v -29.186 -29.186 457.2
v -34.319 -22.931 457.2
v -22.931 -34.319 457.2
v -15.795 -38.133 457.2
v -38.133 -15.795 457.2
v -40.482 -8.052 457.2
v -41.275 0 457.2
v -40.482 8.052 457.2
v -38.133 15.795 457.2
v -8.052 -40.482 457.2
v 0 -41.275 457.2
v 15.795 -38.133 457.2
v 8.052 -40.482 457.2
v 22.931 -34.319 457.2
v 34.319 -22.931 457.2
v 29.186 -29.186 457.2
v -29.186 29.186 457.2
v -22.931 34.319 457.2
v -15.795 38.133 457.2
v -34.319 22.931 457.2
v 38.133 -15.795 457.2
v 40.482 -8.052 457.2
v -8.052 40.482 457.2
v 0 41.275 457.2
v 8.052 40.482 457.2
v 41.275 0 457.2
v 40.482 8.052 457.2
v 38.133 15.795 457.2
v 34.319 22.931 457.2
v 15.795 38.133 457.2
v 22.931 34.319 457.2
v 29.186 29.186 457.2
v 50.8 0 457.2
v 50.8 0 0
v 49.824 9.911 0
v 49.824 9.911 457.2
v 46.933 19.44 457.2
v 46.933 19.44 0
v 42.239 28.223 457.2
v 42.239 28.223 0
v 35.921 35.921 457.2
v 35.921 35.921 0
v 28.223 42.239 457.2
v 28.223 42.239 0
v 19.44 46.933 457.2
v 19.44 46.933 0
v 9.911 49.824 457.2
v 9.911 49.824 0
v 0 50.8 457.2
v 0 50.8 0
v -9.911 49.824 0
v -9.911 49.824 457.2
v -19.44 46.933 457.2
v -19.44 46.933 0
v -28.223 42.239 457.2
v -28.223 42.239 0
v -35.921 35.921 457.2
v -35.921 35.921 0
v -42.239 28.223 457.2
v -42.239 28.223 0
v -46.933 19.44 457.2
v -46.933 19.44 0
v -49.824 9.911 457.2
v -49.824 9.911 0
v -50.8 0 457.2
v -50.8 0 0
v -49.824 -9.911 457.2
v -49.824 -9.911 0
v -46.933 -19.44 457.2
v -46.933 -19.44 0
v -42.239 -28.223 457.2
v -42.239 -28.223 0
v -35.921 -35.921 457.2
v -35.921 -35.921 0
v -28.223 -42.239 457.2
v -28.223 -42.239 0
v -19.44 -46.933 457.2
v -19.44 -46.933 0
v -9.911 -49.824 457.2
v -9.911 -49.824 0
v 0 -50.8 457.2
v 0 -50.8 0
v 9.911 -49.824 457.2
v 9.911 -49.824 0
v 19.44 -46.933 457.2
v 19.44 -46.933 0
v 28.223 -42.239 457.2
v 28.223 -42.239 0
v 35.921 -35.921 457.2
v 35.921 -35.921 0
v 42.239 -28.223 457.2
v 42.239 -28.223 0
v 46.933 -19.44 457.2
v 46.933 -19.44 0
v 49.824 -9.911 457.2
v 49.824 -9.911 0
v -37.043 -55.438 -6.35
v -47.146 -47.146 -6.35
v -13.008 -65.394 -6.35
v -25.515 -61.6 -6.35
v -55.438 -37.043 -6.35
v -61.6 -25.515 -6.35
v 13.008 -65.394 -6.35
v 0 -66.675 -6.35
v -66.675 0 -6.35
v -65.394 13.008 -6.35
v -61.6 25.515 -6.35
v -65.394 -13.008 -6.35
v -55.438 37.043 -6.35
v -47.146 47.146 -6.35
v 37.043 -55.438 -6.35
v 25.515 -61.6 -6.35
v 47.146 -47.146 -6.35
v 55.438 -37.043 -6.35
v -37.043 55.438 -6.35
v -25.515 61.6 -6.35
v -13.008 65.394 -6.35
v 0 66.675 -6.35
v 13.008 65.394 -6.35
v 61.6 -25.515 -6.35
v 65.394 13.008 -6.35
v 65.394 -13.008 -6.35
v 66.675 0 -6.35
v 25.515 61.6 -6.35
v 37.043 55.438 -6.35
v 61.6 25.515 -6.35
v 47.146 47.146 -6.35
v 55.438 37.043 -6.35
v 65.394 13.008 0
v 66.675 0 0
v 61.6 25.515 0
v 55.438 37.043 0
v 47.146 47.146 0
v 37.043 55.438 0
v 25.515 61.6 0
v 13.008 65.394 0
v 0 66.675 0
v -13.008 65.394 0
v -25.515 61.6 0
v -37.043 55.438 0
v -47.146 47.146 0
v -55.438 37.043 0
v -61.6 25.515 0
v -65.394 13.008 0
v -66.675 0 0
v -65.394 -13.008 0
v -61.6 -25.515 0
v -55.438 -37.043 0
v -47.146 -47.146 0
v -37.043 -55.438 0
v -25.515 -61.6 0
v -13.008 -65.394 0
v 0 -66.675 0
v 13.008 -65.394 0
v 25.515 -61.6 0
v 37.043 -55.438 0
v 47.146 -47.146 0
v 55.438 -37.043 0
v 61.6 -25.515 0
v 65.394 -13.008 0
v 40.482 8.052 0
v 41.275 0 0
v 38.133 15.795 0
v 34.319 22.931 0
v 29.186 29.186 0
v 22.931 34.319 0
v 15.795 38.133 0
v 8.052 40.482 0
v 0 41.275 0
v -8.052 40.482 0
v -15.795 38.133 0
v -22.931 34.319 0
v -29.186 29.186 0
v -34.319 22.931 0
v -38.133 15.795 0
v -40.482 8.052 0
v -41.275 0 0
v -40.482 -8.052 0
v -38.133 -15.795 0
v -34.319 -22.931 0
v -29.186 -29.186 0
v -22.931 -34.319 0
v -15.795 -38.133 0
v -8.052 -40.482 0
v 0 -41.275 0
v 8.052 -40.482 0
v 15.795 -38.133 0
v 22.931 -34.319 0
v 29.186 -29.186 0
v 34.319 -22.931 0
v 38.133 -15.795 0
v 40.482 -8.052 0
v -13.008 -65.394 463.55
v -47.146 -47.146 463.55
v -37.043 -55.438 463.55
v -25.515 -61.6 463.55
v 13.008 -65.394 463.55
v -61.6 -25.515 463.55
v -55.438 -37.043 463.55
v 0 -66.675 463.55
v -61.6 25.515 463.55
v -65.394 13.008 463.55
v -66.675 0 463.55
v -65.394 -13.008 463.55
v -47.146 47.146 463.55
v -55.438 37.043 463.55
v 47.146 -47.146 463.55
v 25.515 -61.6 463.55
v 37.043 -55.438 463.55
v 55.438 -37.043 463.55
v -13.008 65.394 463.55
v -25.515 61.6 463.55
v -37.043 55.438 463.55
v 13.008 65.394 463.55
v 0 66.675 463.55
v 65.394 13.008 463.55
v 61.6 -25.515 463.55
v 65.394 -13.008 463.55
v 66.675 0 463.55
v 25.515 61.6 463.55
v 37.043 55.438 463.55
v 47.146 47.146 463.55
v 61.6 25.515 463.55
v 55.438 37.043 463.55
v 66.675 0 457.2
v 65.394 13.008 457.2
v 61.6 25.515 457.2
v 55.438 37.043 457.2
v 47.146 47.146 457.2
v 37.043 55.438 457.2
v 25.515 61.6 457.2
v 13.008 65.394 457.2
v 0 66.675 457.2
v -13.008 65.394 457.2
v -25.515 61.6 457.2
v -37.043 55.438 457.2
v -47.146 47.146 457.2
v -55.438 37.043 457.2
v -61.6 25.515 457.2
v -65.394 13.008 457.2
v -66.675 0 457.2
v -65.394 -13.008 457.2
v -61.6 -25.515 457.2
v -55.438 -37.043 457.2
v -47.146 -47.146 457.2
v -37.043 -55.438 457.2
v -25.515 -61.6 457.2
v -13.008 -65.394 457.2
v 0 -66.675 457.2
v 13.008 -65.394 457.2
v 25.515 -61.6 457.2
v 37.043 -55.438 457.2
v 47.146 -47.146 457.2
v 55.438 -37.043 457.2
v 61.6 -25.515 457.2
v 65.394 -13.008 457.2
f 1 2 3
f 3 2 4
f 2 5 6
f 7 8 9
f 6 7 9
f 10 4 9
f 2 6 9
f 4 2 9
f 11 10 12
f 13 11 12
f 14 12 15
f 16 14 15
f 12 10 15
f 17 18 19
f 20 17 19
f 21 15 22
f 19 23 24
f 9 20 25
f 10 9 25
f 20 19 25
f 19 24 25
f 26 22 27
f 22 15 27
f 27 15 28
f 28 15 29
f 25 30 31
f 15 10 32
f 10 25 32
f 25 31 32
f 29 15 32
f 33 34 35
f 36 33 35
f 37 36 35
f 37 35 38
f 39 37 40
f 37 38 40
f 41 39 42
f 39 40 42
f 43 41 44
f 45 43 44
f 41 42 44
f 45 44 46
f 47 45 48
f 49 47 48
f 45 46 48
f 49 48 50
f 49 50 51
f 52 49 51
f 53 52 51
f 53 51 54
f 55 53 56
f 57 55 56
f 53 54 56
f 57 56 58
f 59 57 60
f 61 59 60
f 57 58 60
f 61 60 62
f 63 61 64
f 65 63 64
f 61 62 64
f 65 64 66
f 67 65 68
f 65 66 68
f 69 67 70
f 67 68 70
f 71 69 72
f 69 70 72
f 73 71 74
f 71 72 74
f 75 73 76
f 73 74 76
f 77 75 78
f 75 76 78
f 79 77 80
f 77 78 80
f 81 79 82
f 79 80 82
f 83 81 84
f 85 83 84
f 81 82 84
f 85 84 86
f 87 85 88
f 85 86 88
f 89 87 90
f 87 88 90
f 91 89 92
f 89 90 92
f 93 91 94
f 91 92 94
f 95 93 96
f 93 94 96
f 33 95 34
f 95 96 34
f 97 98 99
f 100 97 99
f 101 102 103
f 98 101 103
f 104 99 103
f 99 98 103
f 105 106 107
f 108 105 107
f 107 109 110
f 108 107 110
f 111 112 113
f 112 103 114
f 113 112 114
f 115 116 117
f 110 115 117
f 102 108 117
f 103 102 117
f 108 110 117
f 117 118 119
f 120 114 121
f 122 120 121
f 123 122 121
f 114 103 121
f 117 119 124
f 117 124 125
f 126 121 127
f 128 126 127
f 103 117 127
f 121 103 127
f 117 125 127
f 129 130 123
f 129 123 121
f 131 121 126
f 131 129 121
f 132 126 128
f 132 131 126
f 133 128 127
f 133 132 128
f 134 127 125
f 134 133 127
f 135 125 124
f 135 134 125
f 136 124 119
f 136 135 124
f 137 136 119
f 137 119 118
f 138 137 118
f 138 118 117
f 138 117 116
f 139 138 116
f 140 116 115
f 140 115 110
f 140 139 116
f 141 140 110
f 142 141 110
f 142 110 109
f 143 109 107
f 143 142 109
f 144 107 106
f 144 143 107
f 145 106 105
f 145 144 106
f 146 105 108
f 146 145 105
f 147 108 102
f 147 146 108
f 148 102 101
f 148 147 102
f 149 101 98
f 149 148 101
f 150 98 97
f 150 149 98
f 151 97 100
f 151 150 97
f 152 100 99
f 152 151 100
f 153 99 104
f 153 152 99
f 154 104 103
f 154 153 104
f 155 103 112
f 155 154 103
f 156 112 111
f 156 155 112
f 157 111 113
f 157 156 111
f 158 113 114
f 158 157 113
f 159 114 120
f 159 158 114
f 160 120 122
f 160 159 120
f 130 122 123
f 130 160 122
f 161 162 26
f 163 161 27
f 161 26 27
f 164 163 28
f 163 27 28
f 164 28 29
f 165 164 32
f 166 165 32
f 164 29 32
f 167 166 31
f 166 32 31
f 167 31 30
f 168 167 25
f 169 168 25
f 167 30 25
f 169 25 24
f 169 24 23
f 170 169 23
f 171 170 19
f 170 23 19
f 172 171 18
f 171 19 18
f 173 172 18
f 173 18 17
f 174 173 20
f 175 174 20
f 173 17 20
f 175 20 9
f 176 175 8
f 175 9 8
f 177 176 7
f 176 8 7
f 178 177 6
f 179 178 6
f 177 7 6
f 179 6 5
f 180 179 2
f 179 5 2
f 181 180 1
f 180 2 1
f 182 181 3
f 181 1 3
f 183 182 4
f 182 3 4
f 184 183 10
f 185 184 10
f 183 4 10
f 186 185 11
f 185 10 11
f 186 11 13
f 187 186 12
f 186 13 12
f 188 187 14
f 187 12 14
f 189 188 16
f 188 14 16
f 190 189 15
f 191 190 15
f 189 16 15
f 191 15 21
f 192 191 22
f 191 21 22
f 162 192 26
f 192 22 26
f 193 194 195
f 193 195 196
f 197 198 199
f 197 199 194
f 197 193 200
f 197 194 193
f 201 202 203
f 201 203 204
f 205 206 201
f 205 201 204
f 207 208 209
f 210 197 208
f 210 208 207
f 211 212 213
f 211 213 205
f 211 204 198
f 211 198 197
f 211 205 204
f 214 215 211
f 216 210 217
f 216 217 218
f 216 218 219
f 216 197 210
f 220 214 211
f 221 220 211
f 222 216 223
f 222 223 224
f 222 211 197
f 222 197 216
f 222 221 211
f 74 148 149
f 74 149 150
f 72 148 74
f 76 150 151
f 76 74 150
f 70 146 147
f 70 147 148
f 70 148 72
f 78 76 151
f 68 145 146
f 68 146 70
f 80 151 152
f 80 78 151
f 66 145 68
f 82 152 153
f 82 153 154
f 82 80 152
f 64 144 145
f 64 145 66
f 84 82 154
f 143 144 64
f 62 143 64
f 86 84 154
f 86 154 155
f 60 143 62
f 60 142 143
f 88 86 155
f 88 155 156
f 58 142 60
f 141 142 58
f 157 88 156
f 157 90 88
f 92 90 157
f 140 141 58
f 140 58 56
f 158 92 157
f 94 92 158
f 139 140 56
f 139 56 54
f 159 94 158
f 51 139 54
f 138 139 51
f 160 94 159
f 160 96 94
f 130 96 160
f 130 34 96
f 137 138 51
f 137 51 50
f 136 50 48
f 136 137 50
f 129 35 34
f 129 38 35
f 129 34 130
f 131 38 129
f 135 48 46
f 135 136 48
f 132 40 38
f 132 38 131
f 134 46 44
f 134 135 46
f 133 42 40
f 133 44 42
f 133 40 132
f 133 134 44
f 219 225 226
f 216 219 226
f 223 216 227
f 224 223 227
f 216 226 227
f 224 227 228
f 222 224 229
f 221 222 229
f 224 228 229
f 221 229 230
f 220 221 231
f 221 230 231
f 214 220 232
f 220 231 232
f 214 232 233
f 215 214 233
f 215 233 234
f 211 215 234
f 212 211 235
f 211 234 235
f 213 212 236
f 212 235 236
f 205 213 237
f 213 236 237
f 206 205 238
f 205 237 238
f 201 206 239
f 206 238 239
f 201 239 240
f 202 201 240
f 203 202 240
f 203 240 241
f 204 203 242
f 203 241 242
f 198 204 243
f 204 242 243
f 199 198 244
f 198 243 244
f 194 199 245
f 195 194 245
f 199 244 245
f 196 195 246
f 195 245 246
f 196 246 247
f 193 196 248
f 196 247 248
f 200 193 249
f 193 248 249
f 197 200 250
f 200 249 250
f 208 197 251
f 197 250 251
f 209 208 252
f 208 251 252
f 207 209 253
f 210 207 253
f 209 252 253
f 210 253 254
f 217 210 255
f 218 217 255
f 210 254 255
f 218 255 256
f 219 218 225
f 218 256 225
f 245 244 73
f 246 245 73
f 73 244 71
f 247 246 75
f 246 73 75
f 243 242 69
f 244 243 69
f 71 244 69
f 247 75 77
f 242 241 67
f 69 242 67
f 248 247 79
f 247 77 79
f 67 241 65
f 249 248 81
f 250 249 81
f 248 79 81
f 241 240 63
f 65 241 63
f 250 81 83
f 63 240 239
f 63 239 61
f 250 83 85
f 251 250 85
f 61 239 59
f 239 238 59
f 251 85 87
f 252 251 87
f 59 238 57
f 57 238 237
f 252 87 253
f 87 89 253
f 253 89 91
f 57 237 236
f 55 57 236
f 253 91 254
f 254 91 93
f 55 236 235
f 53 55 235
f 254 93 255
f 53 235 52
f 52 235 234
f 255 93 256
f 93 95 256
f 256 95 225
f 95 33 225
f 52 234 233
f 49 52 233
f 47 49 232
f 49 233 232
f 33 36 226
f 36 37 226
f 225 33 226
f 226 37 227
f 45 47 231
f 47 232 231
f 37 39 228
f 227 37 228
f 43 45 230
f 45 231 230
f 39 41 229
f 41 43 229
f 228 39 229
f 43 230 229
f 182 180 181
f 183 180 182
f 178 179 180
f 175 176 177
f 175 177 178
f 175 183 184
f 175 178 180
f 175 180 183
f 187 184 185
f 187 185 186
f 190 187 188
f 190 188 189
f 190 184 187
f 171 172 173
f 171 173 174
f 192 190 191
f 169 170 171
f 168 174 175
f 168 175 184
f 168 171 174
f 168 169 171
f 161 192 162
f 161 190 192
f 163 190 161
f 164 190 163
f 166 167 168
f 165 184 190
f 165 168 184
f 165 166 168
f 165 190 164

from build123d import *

# Parameters (mm, degrees)
SKETCH1_R           = 50.8
BOSS_EXTRUDE1_DEPTH = 457.2
SKETCH2_R           = 41.275
CUT_EXTRUDE1_DEPTH  = 457.2
SKETCH3_R           = 66.675
BOSS_EXTRUDE2_DEPTH = 6.35


with BuildPart() as part:
    # Sketch1 → Boss-Extrude1 (new body)
    with BuildSketch(Plane.XY):
        Circle(SKETCH1_R)
    extrude(amount=BOSS_EXTRUDE1_DEPTH)

    # Sketch2 → Cut-Extrude1 (cut)
    with BuildSketch(Plane.XY.offset(457.2)):
        Circle(SKETCH2_R)
    extrude(amount=-CUT_EXTRUDE1_DEPTH, mode=Mode.SUBTRACT)

    # Sketch3 → Boss-Extrude2 (add)
    with BuildSketch(Plane.XY.offset(457.2)):
        Circle(SKETCH3_R)
    boss_extrude2 = extrude(amount=BOSS_EXTRUDE2_DEPTH)

    # Mirror1: Boss-Extrude2 across plane
    add(boss_extrude2.mirror(Plane.XY.offset(228.6)))


solid = part.part
